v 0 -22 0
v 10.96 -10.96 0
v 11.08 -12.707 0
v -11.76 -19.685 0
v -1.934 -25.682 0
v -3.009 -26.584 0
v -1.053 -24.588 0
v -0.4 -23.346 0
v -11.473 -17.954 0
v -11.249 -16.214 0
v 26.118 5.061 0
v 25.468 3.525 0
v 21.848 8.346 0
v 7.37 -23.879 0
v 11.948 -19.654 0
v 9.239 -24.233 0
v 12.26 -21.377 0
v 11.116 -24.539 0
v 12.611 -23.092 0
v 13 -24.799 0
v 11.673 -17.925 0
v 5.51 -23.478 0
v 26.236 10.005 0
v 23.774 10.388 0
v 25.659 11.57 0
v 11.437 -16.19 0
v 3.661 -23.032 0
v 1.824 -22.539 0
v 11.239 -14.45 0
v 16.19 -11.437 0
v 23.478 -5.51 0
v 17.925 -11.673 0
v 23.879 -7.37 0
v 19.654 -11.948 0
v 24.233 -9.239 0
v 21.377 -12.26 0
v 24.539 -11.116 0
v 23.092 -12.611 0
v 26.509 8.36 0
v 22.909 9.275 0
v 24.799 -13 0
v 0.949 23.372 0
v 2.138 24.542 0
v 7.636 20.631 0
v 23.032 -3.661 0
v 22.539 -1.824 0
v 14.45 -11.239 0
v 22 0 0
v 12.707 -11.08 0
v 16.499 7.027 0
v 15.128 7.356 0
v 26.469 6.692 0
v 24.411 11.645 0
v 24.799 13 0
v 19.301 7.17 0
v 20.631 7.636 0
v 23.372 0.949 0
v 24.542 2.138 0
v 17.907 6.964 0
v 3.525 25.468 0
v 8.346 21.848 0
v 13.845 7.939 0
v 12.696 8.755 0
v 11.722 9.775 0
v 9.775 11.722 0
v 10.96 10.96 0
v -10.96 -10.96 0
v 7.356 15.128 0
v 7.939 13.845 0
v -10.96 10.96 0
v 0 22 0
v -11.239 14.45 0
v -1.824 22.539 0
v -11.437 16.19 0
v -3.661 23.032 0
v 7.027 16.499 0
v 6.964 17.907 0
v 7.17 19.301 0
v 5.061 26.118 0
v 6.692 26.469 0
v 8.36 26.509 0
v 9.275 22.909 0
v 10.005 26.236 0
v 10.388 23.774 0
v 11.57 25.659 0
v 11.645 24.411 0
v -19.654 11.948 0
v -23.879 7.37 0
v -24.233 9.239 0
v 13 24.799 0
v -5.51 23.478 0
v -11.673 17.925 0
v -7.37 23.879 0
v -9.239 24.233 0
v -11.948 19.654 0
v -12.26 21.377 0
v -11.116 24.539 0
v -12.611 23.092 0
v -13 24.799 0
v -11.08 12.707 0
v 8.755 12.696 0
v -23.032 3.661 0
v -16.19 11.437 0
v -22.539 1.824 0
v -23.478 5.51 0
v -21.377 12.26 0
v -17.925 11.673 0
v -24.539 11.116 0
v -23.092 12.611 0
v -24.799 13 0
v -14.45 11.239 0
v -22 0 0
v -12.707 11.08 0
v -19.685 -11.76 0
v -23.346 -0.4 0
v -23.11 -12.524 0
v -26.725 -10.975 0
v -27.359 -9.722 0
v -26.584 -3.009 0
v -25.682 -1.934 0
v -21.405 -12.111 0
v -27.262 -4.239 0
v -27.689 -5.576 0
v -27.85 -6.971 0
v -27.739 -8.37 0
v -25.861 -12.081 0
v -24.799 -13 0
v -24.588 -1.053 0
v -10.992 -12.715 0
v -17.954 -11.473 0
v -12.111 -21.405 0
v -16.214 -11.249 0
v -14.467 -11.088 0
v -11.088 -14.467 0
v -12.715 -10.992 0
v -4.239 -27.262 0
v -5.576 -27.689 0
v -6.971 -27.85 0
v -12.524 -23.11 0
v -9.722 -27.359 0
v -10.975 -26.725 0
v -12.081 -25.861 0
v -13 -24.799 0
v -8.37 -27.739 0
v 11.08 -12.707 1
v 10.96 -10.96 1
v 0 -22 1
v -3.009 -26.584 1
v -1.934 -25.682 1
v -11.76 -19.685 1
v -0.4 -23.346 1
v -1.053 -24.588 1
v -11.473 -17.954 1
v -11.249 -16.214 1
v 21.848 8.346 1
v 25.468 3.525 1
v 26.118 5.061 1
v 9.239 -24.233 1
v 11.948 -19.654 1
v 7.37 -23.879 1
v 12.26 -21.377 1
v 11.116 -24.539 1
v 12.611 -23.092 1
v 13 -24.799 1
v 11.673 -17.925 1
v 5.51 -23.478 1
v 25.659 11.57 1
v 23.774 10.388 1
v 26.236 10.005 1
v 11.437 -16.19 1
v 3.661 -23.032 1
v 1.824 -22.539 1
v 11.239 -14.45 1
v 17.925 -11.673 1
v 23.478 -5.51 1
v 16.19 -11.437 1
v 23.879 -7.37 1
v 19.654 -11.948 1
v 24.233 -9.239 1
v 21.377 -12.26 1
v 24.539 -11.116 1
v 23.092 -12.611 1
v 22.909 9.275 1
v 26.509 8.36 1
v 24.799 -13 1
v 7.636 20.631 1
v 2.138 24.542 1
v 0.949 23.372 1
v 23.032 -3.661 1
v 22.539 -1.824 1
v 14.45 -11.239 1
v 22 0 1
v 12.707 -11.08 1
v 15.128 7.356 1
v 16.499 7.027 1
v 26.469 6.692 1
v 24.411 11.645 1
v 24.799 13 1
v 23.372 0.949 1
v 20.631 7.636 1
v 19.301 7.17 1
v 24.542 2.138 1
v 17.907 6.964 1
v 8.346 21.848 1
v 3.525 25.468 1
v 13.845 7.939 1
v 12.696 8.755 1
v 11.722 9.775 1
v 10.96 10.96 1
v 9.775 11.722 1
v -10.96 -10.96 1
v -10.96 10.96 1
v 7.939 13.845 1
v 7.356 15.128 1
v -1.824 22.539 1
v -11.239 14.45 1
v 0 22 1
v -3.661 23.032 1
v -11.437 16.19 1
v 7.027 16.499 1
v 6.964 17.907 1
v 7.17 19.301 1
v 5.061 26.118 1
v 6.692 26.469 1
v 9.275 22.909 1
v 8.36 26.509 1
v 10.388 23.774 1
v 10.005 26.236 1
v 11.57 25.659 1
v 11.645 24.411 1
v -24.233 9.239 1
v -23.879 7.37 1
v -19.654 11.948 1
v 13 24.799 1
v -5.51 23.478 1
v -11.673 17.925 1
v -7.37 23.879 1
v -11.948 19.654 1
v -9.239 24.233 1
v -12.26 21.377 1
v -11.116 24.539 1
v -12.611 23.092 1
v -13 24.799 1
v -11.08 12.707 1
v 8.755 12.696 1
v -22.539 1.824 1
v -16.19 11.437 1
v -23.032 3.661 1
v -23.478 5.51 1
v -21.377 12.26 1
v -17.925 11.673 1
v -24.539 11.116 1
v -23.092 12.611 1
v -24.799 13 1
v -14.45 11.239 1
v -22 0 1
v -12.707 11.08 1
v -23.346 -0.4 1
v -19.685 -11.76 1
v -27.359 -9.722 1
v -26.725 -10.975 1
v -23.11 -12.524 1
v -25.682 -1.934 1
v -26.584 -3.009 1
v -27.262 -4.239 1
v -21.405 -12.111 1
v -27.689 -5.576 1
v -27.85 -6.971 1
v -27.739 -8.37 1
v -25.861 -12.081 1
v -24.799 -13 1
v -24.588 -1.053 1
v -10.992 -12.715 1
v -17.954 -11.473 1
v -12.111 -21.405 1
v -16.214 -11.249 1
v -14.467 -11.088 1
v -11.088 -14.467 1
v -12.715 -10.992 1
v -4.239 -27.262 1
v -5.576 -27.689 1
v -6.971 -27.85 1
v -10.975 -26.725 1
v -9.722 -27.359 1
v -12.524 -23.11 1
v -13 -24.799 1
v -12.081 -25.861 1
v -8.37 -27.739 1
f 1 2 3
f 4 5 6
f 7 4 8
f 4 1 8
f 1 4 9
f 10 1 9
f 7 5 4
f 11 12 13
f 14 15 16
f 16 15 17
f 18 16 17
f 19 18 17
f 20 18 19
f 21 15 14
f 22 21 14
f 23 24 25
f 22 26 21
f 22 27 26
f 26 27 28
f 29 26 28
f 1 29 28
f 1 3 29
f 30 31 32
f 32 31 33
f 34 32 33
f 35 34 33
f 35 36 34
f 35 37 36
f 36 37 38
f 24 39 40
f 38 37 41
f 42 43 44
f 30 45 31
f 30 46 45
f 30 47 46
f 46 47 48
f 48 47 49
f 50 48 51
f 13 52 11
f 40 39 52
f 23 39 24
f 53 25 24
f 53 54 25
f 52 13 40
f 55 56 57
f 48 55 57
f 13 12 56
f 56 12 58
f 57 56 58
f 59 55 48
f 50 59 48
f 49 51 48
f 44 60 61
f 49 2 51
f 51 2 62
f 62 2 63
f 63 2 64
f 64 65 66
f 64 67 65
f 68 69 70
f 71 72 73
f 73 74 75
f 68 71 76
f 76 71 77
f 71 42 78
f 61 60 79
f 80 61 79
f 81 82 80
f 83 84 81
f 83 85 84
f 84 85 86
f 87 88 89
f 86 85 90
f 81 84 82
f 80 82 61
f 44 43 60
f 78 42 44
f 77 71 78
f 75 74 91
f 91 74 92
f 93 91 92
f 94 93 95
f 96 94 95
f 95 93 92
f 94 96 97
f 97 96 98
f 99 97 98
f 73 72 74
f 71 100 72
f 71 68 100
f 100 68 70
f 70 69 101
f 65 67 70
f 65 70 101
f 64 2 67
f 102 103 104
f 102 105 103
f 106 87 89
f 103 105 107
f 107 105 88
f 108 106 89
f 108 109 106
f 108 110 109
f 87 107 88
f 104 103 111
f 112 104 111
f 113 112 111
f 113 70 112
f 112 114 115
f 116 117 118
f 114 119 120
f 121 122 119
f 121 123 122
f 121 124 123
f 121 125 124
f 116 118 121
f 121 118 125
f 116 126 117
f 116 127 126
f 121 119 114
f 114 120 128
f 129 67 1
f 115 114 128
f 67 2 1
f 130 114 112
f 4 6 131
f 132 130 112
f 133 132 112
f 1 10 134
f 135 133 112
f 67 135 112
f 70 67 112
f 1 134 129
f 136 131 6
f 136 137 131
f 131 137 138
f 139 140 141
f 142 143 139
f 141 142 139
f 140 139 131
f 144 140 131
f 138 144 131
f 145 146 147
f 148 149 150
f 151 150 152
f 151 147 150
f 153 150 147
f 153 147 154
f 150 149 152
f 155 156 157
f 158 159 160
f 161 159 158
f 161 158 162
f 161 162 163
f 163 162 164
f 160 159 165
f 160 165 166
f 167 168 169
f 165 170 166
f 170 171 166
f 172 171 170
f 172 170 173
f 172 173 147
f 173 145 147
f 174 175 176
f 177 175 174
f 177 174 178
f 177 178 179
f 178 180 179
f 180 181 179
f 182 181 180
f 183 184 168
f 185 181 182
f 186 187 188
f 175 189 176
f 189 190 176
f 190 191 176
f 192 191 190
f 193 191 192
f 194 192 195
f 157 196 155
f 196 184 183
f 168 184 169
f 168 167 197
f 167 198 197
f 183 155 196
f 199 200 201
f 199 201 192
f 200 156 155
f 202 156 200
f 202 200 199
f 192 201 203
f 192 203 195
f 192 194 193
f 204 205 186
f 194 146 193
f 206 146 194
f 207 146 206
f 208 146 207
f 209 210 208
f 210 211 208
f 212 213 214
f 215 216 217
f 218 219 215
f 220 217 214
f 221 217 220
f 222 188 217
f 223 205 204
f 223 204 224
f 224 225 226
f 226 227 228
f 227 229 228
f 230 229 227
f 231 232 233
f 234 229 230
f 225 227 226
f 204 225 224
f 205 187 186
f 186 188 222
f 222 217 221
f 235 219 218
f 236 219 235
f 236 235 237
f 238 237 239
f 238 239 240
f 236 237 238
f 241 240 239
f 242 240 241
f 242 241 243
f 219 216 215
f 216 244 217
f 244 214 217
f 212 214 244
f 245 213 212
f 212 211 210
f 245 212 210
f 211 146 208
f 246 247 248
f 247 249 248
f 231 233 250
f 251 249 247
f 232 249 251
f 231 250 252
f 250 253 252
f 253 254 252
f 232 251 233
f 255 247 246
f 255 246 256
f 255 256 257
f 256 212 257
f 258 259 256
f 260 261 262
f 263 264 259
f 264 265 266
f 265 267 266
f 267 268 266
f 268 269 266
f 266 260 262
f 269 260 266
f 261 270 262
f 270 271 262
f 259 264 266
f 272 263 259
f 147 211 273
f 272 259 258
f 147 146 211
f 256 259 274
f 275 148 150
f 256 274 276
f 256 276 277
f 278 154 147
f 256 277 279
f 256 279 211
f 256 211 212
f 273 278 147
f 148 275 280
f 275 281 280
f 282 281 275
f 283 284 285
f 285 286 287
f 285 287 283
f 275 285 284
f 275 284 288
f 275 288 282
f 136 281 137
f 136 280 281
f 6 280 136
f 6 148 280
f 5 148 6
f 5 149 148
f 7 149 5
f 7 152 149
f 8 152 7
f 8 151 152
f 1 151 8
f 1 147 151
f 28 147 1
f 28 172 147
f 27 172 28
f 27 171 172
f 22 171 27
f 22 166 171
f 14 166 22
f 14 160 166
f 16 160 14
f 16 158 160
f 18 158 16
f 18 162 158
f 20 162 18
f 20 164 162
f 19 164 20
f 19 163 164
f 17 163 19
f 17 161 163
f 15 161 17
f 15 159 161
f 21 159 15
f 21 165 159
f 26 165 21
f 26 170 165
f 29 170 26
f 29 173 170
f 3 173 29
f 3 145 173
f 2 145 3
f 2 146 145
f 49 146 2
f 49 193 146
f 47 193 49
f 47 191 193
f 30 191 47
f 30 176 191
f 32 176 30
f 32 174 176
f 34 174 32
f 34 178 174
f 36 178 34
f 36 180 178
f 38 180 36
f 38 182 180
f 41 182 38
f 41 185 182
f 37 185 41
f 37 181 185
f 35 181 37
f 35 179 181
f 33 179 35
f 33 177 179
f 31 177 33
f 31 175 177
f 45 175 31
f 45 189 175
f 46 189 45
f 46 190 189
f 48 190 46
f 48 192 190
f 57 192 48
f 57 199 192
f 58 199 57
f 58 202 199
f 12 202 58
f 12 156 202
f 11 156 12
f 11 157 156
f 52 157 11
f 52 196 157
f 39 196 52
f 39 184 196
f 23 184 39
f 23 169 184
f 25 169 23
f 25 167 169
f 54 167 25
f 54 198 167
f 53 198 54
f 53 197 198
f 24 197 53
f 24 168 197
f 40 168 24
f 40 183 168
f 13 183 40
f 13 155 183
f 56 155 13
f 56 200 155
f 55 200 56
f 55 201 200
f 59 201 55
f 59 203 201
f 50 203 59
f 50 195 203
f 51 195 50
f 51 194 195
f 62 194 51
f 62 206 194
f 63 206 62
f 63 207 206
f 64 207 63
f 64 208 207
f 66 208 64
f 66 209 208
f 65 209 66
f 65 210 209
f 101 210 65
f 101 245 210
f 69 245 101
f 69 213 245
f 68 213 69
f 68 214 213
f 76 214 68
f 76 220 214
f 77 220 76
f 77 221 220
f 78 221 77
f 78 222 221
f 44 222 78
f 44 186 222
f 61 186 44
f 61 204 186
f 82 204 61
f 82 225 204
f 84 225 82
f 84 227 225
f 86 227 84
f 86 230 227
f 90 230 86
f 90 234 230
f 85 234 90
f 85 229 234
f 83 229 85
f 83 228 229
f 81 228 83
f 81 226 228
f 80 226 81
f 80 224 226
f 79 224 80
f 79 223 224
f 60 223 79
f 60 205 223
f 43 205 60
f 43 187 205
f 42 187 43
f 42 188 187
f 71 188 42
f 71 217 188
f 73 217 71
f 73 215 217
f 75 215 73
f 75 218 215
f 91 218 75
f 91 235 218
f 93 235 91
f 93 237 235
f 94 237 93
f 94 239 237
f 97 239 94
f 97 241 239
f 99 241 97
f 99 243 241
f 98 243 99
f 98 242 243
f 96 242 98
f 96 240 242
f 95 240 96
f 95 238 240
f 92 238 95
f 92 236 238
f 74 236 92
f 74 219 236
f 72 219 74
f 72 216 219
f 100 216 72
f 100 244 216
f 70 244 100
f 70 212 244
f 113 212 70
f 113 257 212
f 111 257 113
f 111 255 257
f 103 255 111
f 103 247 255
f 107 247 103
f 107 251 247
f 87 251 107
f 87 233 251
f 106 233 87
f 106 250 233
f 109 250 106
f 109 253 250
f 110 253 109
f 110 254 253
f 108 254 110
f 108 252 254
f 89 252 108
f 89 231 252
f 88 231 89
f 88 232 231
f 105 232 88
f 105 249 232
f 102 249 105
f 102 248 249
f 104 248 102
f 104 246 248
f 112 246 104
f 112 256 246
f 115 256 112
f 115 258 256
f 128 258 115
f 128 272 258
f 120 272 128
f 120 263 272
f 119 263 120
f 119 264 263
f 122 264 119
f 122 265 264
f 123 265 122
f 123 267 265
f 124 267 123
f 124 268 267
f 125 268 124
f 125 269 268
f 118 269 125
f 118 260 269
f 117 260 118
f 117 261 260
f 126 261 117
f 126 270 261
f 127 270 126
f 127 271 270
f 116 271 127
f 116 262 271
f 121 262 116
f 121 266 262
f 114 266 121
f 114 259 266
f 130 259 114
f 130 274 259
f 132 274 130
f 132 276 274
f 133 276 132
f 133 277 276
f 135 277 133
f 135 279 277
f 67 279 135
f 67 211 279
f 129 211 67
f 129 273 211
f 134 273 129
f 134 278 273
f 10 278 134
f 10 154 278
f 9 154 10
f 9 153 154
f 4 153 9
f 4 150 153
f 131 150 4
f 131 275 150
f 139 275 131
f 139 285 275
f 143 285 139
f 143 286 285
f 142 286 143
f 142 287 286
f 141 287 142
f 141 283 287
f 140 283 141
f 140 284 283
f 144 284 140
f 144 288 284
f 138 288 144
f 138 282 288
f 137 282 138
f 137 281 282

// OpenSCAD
// Generated by Parametrix
ca_myPartM_face1_000 = [ [ 22.0000, 0.0000 ],[ 23.3718, 0.9490 ],[ 24.5416, 2.1382 ],[ 25.4681, 3.5253 ],[ 26.1184, 5.0614 ],[ 26.4695, 6.6921 ],[ 26.5091, 8.3598 ],[ 26.2356, 10.0053 ],[ 25.6589, 11.5705 ],[ 24.7992, 13.0000 ],[ 24.4115, 11.6449 ],[ 23.7736, 10.3880 ],[ 22.9088, 9.2751 ],[ 21.8484, 8.3465 ],[ 20.6311, 7.6361 ],[ 19.3011, 7.1696 ],[ 17.9067, 6.9641 ],[ 16.4986, 7.0269 ],[ 15.1281, 7.3559 ],[ 13.8449, 7.9391 ],[ 12.6957, 8.7552 ],[ 11.7224, 9.7746 ],[ 10.9602, 10.9602 ],[ 9.7746, 11.7224 ],[ 8.7552, 12.6957 ],[ 7.9391, 13.8449 ],[ 7.3559, 15.1281 ],[ 7.0269, 16.4986 ],[ 6.9641, 17.9067 ],[ 7.1696, 19.3011 ],[ 7.6361, 20.6311 ],[ 8.3465, 21.8484 ],[ 9.2751, 22.9088 ],[ 10.3880, 23.7736 ],[ 11.6449, 24.4115 ],[ 13.0000, 24.7992 ],[ 11.5705, 25.6589 ],[ 10.0053, 26.2356 ],[ 8.3598, 26.5091 ],[ 6.6921, 26.4695 ],[ 5.0614, 26.1184 ],[ 3.5253, 25.4681 ],[ 2.1382, 24.5416 ],[ 0.9490, 23.3718 ],[ 0.0000, 22.0000 ],[ -1.8242, 22.5387 ],[ -3.6613, 23.0317 ],[ -5.5102, 23.4785 ],[ -7.3696, 23.8788 ],[ -9.2386, 24.2326 ],[ -11.1157, 24.5394 ],[ -13.0000, 24.7992 ],[ -12.6112, 23.0921 ],[ -12.2604, 21.3768 ],[ -11.9477, 19.6541 ],[ -11.6732, 17.9249 ],[ -11.4371, 16.1901 ],[ -11.2395, 14.4504 ],[ -11.0805, 12.7068 ],[ -10.9602, 10.9602 ],[ -12.7068, 11.0805 ],[ -14.4504, 11.2395 ],[ -16.1901, 11.4371 ],[ -17.9249, 11.6732 ],[ -19.6541, 11.9477 ],[ -21.3768, 12.2604 ],[ -23.0921, 12.6112 ],[ -24.7992, 13.0000 ],[ -24.5394, 11.1157 ],[ -24.2326, 9.2386 ],[ -23.8788, 7.3696 ],[ -23.4785, 5.5102 ],[ -23.0317, 3.6613 ],[ -22.5387, 1.8242 ],[ -22.0000, 0.0000 ],[ -23.3456, -0.4004 ],[ -24.5885, -1.0533 ],[ -25.6819, -1.9340 ],[ -26.5844, -3.0094 ],[ -27.2621, -4.2390 ],[ -27.6895, -5.5763 ],[ -27.8504, -6.9710 ],[ -27.7388, -8.3705 ],[ -27.3588, -9.7220 ],[ -26.7249, -10.9747 ],[ -25.8608, -12.0813 ],[ -24.7992, -13.0000 ],[ -23.1101, -12.5245 ],[ -21.4048, -12.1112 ],[ -19.6854, -11.7604 ],[ -17.9544, -11.4729 ],[ -16.2141, -11.2488 ],[ -14.4667, -11.0885 ],[ -12.7146, -10.9923 ],[ -10.9602, -10.9602 ],[ -10.9923, -12.7146 ],[ -11.0885, -14.4667 ],[ -11.2488, -16.2141 ],[ -11.4729, -17.9544 ],[ -11.7604, -19.6854 ],[ -12.1112, -21.4048 ],[ -12.5245, -23.1101 ],[ -13.0000, -24.7992 ],[ -12.0813, -25.8608 ],[ -10.9747, -26.7249 ],[ -9.7220, -27.3588 ],[ -8.3705, -27.7388 ],[ -6.9710, -27.8504 ],[ -5.5763, -27.6895 ],[ -4.2390, -27.2621 ],[ -3.0094, -26.5844 ],[ -1.9340, -25.6819 ],[ -1.0533, -24.5885 ],[ -0.4004, -23.3456 ],[ -0.0000, -22.0000 ],[ 1.8242, -22.5387 ],[ 3.6613, -23.0317 ],[ 5.5102, -23.4785 ],[ 7.3696, -23.8788 ],[ 9.2386, -24.2326 ],[ 11.1157, -24.5394 ],[ 13.0000, -24.7992 ],[ 12.6112, -23.0921 ],[ 12.2604, -21.3768 ],[ 11.9477, -19.6541 ],[ 11.6732, -17.9249 ],[ 11.4371, -16.1901 ],[ 11.2395, -14.4504 ],[ 11.0805, -12.7068 ],[ 10.9602, -10.9602 ],[ 12.7068, -11.0805 ],[ 14.4504, -11.2395 ],[ 16.1901, -11.4371 ],[ 17.9249, -11.6732 ],[ 19.6541, -11.9477 ],[ 21.3768, -12.2604 ],[ 23.0921, -12.6112 ],[ 24.7992, -13.0000 ],[ 24.5394, -11.1157 ],[ 24.2326, -9.2386 ],[ 23.8788, -7.3696 ],[ 23.4785, -5.5102 ],[ 23.0317, -3.6613 ],[ 22.5387, -1.8242 ],[ 22.0000, 0.0000 ] ];
cb_myPartM_face1_000 = [  0, 1, 2, 3, 4, 5, 6, 7, 8, 9, 10, 11, 12, 13, 14, 15, 16, 17, 18, 19, 20, 21, 22, 23, 24, 25, 26, 27, 28, 29, 30, 31, 32, 33, 34, 35, 36, 37, 38, 39, 40, 41, 42, 43, 44, 45, 46, 47, 48, 49, 50, 51, 52, 53, 54, 55, 56, 57, 58, 59, 60, 61, 62, 63, 64, 65, 66, 67, 68, 69, 70, 71, 72, 73, 74, 75, 76, 77, 78, 79, 80, 81, 82, 83, 84, 85, 86, 87, 88, 89, 90, 91, 92, 93, 94, 95, 96, 97, 98, 99, 100, 101, 102, 103, 104, 105, 106, 107, 108, 109, 110, 111, 112, 113, 114, 115, 116, 117, 118, 119, 120, 121, 122, 123, 124, 125, 126, 127, 128, 129, 130, 131, 132, 133, 134, 135, 136, 137, 138, 139, 140, 141, 142, 143, 144 ];
a_myPartM_face1 = concat(ca_myPartM_face1_000);
b_myPartM_face1 = [cb_myPartM_face1_000];

module subpax_myPartM () {
	translate( [ 0, 0, 0 ])
		rotate( [ 0, 0, 0 ])
			   linear_extrude(height = 1) polygon(a_myPartM_face1, b_myPartM_face1);
}

module pax_myPartM () {
	subpax_myPartM();
}

pax_myPartM();
